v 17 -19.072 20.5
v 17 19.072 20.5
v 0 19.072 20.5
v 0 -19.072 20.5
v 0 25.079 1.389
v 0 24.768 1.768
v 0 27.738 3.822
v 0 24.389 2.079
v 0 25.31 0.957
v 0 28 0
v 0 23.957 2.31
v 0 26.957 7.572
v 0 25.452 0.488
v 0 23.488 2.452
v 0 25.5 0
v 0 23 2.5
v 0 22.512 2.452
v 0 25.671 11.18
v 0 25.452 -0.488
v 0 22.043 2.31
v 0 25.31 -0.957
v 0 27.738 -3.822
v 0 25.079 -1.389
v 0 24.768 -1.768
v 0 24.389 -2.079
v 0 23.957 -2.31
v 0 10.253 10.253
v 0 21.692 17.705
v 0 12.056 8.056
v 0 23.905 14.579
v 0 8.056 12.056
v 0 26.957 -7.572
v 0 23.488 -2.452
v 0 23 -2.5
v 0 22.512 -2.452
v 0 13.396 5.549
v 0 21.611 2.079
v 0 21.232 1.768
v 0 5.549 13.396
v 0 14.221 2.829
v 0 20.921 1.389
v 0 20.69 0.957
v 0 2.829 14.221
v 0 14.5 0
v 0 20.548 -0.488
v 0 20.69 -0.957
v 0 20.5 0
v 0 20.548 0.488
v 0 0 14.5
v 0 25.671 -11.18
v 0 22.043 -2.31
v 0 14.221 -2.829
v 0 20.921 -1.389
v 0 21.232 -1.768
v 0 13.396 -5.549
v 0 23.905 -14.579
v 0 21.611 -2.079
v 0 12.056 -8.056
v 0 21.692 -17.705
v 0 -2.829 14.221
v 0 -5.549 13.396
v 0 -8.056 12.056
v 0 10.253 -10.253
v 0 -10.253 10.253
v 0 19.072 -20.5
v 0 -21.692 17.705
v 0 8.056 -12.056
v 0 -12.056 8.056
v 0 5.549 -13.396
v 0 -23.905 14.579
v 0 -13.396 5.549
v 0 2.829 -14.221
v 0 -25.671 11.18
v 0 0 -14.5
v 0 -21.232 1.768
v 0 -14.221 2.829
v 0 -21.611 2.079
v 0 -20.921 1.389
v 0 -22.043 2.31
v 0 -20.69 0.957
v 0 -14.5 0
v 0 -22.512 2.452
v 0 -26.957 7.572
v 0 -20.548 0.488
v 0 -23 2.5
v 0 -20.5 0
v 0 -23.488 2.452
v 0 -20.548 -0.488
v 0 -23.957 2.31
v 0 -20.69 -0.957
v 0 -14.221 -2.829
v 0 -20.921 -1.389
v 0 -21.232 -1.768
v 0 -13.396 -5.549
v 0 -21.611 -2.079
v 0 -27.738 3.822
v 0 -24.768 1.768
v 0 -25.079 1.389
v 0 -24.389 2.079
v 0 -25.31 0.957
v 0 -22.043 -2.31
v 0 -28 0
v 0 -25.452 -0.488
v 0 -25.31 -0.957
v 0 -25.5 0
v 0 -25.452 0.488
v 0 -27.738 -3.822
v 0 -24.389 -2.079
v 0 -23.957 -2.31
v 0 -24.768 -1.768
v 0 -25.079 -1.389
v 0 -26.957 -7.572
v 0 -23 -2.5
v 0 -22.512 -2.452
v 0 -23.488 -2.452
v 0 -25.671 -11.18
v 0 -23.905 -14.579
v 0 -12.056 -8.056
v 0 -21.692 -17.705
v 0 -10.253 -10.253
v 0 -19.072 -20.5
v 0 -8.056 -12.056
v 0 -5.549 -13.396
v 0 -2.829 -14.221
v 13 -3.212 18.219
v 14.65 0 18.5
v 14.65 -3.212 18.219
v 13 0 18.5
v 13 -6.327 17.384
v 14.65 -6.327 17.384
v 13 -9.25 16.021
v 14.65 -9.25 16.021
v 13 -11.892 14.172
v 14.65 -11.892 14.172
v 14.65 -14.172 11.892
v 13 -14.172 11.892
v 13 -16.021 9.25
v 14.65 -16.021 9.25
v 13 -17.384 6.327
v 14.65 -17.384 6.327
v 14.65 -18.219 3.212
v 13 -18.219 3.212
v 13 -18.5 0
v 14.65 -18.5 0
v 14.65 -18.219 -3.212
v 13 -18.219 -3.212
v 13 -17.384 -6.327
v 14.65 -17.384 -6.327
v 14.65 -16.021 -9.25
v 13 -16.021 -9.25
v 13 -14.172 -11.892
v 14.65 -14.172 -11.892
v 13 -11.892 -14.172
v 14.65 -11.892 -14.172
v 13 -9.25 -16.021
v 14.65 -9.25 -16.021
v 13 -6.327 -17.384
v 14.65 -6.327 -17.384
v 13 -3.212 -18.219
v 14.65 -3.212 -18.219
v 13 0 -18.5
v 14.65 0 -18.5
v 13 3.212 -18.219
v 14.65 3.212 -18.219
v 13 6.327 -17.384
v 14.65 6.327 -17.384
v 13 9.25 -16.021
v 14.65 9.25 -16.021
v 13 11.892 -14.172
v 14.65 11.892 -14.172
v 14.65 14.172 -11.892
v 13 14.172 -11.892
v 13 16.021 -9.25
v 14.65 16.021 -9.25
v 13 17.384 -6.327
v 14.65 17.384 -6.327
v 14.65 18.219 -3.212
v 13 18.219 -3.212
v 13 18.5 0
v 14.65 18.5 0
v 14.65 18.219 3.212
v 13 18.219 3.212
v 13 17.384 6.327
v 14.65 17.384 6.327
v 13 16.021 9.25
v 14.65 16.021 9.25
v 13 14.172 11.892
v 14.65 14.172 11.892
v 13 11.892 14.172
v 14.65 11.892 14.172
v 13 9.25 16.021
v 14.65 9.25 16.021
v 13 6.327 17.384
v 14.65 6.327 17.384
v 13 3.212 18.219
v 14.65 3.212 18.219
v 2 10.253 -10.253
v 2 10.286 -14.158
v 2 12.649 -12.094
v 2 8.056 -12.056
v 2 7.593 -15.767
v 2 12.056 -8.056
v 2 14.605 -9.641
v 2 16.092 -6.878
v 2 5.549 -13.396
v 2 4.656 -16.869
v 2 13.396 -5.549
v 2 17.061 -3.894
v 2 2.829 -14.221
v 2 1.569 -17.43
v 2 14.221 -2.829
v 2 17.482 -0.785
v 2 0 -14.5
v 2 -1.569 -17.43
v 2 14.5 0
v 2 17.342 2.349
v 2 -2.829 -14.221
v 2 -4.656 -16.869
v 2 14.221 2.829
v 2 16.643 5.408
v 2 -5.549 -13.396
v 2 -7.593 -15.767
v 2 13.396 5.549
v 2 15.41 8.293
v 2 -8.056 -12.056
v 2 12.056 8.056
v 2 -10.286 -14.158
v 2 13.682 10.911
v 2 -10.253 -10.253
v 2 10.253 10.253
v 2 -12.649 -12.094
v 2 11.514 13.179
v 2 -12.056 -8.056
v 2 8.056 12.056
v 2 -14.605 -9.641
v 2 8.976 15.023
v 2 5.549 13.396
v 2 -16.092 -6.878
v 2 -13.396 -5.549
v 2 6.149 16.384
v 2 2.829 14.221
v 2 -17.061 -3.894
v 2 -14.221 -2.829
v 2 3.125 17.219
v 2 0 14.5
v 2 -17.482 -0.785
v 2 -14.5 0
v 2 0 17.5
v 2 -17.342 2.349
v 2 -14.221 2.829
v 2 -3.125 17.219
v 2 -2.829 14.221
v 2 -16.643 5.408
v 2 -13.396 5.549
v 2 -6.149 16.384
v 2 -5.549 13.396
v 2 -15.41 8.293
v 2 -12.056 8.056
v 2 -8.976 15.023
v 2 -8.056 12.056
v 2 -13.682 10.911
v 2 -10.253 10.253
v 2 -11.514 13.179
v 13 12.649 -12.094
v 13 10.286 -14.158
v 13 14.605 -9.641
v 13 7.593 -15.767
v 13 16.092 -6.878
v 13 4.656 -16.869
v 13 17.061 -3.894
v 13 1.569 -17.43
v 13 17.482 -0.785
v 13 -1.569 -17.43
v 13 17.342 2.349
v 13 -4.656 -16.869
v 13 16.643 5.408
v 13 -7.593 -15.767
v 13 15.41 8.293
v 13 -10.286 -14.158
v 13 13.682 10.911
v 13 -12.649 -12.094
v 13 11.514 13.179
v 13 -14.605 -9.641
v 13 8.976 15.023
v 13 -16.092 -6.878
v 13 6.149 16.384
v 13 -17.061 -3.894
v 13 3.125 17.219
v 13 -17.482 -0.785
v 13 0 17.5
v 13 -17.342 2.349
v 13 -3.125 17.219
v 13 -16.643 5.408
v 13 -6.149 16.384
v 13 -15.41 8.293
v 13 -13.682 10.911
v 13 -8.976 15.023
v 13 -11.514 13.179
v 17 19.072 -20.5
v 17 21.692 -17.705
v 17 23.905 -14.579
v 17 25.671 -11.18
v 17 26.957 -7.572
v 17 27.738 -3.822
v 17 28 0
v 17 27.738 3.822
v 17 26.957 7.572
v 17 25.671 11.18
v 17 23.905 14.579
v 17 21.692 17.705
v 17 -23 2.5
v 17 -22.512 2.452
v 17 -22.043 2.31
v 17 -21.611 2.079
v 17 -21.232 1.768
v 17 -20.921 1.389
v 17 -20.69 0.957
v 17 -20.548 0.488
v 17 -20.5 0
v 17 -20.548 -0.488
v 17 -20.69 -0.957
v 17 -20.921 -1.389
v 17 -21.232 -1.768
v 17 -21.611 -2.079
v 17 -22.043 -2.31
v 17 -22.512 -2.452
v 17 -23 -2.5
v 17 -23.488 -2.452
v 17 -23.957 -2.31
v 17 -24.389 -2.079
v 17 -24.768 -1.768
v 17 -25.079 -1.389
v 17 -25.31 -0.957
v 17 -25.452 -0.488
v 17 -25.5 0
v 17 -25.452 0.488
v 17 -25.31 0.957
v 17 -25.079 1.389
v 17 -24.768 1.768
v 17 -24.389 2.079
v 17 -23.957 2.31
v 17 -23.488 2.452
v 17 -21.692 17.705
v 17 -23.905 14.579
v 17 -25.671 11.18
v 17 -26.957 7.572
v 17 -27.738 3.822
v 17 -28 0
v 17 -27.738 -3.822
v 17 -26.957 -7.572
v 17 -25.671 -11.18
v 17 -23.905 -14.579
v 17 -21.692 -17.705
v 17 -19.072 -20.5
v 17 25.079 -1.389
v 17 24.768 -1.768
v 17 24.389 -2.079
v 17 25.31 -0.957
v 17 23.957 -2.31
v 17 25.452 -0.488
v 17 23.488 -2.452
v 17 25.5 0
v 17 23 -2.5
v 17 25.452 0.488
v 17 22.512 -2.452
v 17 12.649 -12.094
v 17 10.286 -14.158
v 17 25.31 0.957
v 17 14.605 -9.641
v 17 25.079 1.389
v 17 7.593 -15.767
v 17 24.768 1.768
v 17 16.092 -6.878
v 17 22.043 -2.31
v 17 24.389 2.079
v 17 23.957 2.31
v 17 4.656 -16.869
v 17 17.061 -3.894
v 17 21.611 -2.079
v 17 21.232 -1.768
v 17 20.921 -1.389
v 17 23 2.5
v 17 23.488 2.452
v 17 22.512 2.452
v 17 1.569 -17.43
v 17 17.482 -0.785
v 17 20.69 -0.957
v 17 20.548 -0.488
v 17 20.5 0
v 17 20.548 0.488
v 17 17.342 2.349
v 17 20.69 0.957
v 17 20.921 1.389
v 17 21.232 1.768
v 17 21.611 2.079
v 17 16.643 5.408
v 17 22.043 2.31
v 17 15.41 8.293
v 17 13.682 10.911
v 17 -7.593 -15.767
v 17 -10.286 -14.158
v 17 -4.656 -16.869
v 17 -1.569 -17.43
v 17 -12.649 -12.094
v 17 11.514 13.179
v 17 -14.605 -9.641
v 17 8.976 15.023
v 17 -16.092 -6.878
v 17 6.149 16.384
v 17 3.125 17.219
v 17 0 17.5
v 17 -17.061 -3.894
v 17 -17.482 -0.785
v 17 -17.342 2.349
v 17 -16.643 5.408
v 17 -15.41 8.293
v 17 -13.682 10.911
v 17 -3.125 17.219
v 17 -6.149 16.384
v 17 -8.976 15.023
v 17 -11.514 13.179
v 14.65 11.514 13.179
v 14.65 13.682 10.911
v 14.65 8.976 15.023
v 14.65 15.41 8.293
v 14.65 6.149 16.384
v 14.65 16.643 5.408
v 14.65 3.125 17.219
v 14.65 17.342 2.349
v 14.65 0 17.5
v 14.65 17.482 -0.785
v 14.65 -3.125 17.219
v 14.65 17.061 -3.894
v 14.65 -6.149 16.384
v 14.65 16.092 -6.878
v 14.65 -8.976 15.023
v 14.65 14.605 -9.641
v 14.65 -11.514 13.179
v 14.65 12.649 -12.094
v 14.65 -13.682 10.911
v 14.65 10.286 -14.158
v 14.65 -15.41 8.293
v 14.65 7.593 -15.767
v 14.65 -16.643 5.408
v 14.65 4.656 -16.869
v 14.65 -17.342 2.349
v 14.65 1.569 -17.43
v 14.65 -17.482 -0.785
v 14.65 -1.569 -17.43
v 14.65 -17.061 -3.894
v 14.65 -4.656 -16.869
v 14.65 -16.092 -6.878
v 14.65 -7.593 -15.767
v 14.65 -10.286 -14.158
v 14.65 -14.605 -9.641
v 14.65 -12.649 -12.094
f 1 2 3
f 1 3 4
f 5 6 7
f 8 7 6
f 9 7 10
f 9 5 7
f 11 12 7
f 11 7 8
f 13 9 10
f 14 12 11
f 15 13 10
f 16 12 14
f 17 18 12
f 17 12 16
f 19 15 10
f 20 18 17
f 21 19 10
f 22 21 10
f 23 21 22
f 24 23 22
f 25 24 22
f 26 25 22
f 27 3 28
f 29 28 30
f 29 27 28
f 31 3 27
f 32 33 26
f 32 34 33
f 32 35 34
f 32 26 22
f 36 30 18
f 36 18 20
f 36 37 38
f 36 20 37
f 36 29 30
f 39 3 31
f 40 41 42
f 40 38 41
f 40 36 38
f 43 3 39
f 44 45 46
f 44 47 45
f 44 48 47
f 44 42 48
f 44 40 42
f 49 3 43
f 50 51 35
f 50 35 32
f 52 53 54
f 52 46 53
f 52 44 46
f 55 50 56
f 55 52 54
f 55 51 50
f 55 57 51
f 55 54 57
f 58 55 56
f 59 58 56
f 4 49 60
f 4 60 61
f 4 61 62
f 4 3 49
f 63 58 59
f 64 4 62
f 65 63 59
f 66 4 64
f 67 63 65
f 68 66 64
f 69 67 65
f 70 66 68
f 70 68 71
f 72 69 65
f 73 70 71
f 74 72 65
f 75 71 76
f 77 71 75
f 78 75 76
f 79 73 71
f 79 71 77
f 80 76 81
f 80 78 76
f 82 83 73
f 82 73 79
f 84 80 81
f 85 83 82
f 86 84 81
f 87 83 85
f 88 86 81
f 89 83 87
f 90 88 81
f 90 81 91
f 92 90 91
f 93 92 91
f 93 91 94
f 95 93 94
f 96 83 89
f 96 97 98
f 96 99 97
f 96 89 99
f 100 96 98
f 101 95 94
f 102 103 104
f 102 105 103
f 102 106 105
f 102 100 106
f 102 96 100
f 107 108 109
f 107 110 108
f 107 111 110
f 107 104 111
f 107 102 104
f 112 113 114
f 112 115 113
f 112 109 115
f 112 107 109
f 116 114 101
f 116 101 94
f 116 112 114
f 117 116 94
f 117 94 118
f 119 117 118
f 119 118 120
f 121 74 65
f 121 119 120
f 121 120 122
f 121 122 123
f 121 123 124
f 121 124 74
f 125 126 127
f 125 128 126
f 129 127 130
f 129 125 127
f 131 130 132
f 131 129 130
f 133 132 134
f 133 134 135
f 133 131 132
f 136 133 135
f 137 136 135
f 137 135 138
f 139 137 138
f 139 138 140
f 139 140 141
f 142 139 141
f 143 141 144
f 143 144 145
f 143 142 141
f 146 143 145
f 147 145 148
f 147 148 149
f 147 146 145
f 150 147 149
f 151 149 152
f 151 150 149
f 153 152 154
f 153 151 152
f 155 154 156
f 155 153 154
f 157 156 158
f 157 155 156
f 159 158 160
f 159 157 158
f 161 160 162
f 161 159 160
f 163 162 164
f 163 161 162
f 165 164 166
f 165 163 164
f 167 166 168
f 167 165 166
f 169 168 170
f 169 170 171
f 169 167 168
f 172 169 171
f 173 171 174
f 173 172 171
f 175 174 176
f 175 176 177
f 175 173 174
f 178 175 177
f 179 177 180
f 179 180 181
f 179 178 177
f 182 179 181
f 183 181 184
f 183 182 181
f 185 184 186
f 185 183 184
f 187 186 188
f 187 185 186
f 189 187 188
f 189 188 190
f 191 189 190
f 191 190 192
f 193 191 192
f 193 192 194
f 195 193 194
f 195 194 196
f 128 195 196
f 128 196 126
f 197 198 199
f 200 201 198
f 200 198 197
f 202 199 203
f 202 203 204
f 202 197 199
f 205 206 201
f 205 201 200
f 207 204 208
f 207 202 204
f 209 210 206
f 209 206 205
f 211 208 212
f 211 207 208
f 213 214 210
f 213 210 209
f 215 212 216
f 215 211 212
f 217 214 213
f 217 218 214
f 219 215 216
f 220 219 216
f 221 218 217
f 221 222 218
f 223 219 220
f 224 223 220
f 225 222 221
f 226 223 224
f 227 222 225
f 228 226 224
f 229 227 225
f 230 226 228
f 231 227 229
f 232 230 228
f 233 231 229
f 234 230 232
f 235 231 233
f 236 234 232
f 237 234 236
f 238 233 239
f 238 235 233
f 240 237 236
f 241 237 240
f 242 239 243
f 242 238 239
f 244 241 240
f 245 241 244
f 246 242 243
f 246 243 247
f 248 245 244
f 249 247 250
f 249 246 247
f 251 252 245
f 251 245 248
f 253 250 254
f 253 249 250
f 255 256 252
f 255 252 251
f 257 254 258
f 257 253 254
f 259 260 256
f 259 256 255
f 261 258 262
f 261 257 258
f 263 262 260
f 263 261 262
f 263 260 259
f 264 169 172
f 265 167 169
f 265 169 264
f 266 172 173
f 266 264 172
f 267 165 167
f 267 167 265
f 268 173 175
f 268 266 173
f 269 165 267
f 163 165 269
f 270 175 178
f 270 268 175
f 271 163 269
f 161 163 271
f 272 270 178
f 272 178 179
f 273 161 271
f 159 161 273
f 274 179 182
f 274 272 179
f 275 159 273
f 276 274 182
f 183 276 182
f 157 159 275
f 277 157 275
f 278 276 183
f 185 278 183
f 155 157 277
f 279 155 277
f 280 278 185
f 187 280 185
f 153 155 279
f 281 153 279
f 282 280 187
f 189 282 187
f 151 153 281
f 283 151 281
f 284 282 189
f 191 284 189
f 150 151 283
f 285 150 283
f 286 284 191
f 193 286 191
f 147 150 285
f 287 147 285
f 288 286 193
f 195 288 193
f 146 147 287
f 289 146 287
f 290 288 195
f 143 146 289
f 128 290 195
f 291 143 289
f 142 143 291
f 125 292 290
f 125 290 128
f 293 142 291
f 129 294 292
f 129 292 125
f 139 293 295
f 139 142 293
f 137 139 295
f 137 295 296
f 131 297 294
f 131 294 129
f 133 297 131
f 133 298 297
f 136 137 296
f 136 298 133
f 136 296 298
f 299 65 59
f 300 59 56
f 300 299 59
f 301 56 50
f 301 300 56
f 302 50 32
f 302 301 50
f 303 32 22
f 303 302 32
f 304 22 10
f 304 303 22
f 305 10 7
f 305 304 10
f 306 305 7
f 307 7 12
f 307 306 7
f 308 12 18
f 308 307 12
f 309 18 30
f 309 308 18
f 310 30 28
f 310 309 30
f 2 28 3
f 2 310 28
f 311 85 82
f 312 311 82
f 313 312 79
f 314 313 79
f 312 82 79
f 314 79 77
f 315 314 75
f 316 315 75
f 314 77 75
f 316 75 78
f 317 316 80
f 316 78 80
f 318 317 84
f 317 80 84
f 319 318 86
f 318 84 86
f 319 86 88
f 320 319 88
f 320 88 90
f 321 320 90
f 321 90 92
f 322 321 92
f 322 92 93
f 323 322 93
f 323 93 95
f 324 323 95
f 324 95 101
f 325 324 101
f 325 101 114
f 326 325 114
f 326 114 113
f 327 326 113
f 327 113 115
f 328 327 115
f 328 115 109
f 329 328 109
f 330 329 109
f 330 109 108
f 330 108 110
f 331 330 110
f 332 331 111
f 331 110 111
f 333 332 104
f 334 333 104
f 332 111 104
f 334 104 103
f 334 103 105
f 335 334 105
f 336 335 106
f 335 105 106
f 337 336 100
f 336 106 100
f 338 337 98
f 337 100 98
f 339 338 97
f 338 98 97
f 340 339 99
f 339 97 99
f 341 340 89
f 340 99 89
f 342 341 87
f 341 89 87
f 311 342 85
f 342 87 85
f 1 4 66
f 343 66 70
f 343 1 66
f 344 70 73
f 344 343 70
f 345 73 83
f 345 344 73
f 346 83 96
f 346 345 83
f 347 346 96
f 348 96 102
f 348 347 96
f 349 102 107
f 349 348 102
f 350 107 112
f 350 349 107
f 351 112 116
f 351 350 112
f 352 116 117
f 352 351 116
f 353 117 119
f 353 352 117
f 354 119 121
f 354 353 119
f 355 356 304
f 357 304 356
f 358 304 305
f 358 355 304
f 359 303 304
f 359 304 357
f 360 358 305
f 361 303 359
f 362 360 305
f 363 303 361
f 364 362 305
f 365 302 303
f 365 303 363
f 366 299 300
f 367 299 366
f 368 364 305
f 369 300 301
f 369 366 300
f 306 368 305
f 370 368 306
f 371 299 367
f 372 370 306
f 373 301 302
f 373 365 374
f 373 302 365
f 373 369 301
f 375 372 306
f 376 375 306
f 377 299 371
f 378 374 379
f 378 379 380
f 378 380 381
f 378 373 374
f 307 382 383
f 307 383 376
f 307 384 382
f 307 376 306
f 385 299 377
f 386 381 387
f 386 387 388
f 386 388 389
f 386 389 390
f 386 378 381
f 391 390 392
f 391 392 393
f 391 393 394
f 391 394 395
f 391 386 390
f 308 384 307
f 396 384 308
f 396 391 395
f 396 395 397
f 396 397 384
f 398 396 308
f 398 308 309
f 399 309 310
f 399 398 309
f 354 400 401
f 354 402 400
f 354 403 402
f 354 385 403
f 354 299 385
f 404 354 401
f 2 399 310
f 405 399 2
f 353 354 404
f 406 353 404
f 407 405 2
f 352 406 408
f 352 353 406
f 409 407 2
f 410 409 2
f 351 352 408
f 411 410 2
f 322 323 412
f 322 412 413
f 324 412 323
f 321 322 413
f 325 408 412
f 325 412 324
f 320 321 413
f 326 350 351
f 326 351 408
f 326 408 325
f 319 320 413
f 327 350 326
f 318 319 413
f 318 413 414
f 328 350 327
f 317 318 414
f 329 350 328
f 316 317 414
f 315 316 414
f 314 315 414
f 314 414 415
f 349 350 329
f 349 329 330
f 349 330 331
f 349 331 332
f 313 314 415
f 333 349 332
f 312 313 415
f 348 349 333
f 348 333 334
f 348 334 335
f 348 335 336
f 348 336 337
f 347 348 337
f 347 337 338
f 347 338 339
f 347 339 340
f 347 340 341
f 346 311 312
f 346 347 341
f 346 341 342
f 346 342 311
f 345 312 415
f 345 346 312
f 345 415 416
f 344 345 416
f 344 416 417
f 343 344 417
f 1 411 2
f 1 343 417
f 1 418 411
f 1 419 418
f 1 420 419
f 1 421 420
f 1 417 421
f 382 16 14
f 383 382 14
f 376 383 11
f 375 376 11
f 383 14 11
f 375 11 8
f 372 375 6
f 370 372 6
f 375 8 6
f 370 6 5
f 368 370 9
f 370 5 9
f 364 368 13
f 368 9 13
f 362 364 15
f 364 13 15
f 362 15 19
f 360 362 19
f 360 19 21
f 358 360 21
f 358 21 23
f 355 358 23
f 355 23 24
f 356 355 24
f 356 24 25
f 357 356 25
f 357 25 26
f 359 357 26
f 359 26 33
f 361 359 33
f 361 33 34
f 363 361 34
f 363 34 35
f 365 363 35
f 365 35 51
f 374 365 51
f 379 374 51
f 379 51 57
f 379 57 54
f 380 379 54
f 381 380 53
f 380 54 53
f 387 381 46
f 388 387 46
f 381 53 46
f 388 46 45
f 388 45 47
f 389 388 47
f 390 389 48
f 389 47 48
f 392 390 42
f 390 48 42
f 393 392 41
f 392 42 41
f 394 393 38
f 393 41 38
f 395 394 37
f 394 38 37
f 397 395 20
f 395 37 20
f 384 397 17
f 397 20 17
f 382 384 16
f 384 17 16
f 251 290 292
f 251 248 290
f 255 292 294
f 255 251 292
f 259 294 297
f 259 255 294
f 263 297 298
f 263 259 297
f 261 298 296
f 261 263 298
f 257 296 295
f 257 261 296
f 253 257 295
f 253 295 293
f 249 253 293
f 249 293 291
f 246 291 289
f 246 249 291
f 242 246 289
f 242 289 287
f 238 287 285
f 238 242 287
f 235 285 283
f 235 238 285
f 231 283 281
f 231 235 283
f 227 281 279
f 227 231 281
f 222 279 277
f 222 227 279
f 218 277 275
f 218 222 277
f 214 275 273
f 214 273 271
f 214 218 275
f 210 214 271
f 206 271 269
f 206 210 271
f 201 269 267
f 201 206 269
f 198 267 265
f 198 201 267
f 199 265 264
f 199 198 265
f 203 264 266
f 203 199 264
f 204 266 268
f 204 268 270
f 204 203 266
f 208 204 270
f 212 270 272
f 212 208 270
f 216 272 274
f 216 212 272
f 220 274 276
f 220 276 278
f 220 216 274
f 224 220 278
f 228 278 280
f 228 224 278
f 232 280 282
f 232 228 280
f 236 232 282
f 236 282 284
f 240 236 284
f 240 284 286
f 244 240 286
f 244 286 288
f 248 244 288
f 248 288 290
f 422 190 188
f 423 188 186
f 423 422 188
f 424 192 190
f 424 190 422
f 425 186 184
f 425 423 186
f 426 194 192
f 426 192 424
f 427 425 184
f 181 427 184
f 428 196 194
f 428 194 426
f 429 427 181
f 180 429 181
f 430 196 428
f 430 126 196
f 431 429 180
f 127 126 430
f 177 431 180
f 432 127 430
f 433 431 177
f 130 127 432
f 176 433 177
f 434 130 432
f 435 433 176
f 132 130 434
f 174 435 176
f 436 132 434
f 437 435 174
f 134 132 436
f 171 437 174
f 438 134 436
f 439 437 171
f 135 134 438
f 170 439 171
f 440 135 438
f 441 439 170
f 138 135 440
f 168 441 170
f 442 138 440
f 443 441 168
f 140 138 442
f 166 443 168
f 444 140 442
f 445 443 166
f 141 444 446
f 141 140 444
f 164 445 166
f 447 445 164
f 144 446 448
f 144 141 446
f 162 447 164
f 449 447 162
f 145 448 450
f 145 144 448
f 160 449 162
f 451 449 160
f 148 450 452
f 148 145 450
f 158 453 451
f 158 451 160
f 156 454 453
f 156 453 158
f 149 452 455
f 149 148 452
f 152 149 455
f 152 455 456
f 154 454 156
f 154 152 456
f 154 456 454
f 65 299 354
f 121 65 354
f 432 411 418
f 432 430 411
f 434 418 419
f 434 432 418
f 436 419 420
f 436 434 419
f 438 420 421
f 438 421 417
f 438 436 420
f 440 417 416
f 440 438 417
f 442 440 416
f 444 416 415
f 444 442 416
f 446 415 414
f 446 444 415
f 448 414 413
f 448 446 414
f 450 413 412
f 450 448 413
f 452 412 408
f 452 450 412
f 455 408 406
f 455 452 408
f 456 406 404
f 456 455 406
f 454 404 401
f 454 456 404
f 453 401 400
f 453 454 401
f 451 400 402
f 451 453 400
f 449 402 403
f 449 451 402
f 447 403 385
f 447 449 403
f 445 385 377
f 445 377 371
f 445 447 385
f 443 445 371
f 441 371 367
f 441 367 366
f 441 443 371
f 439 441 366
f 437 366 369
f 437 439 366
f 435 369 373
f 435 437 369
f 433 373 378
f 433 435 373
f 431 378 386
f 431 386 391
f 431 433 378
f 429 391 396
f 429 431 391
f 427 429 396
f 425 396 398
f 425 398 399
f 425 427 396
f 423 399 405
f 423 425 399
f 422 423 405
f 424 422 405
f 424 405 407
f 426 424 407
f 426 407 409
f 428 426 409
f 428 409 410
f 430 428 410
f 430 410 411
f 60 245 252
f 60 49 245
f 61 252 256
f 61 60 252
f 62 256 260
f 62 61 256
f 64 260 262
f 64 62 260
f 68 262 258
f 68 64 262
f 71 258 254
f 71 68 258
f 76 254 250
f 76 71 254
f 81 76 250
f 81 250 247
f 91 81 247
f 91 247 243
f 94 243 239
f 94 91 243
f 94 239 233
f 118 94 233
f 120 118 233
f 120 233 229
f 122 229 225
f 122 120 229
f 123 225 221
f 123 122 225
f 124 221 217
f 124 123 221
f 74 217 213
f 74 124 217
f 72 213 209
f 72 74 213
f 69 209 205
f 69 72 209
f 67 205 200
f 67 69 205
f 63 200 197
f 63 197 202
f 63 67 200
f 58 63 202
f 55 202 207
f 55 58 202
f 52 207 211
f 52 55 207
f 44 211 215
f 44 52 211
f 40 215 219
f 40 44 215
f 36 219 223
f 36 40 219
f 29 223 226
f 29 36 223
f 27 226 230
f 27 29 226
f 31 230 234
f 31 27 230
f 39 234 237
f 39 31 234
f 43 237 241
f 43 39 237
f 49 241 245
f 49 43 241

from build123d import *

# Parameters (mm, degrees)
CUT_EXTRUDE1_DEPTH = 44.092922853
TAPPED_HOLE1_D     = 5


with BuildPart() as part:
    # Sketch1 → Revolve1 (revolve)
    with BuildSketch(Plane.XY, mode=Mode.PRIVATE) as revolve1_sk:
        Polygon((0, 28), (17, 28), (17, 17.5), (14.65, 17.5), (14.65, 18.5), (13, 18.5), (13, 17.5), (2, 17.5), (2, 14.5), (0, 14.5), align=None)
    revolve(revolve1_sk.sketch.rotate(Axis((0, 0, 0), (1, 0, 0)), 90), axis=Axis((0, 0, 0), (1, 0, 0)))

    # Sketch2 → Cut-Extrude1 (cut, through all)
    with BuildSketch(Plane(origin=(17, 0, 0), x_dir=(0, 0, -1), z_dir=(1, 0, 0))):
        with BuildLine():
            Line((-20.5, 19.072231123), (-20.5, -19.072231123))
            ThreePointArc((-20.5, -19.072231123), (-28, 0), (-20.5, 19.072231123))
        make_face()
        with BuildLine():
            Line((20.5, 19.072231123), (20.5, -19.072231123))
            ThreePointArc((20.5, -19.072231123), (28, 0), (20.5, 19.072231123))
        make_face()
    extrude(amount=-CUT_EXTRUDE1_DEPTH, mode=Mode.SUBTRACT)

    # Tapped Hole1 (through all)
    with Locations(Plane(origin=(17, 0, 0), x_dir=(0, 0, -1), z_dir=(1, 0, 0))):
        with Locations((0, 23), (0, -23)):
            Hole(TAPPED_HOLE1_D / 2)


solid = part.part
